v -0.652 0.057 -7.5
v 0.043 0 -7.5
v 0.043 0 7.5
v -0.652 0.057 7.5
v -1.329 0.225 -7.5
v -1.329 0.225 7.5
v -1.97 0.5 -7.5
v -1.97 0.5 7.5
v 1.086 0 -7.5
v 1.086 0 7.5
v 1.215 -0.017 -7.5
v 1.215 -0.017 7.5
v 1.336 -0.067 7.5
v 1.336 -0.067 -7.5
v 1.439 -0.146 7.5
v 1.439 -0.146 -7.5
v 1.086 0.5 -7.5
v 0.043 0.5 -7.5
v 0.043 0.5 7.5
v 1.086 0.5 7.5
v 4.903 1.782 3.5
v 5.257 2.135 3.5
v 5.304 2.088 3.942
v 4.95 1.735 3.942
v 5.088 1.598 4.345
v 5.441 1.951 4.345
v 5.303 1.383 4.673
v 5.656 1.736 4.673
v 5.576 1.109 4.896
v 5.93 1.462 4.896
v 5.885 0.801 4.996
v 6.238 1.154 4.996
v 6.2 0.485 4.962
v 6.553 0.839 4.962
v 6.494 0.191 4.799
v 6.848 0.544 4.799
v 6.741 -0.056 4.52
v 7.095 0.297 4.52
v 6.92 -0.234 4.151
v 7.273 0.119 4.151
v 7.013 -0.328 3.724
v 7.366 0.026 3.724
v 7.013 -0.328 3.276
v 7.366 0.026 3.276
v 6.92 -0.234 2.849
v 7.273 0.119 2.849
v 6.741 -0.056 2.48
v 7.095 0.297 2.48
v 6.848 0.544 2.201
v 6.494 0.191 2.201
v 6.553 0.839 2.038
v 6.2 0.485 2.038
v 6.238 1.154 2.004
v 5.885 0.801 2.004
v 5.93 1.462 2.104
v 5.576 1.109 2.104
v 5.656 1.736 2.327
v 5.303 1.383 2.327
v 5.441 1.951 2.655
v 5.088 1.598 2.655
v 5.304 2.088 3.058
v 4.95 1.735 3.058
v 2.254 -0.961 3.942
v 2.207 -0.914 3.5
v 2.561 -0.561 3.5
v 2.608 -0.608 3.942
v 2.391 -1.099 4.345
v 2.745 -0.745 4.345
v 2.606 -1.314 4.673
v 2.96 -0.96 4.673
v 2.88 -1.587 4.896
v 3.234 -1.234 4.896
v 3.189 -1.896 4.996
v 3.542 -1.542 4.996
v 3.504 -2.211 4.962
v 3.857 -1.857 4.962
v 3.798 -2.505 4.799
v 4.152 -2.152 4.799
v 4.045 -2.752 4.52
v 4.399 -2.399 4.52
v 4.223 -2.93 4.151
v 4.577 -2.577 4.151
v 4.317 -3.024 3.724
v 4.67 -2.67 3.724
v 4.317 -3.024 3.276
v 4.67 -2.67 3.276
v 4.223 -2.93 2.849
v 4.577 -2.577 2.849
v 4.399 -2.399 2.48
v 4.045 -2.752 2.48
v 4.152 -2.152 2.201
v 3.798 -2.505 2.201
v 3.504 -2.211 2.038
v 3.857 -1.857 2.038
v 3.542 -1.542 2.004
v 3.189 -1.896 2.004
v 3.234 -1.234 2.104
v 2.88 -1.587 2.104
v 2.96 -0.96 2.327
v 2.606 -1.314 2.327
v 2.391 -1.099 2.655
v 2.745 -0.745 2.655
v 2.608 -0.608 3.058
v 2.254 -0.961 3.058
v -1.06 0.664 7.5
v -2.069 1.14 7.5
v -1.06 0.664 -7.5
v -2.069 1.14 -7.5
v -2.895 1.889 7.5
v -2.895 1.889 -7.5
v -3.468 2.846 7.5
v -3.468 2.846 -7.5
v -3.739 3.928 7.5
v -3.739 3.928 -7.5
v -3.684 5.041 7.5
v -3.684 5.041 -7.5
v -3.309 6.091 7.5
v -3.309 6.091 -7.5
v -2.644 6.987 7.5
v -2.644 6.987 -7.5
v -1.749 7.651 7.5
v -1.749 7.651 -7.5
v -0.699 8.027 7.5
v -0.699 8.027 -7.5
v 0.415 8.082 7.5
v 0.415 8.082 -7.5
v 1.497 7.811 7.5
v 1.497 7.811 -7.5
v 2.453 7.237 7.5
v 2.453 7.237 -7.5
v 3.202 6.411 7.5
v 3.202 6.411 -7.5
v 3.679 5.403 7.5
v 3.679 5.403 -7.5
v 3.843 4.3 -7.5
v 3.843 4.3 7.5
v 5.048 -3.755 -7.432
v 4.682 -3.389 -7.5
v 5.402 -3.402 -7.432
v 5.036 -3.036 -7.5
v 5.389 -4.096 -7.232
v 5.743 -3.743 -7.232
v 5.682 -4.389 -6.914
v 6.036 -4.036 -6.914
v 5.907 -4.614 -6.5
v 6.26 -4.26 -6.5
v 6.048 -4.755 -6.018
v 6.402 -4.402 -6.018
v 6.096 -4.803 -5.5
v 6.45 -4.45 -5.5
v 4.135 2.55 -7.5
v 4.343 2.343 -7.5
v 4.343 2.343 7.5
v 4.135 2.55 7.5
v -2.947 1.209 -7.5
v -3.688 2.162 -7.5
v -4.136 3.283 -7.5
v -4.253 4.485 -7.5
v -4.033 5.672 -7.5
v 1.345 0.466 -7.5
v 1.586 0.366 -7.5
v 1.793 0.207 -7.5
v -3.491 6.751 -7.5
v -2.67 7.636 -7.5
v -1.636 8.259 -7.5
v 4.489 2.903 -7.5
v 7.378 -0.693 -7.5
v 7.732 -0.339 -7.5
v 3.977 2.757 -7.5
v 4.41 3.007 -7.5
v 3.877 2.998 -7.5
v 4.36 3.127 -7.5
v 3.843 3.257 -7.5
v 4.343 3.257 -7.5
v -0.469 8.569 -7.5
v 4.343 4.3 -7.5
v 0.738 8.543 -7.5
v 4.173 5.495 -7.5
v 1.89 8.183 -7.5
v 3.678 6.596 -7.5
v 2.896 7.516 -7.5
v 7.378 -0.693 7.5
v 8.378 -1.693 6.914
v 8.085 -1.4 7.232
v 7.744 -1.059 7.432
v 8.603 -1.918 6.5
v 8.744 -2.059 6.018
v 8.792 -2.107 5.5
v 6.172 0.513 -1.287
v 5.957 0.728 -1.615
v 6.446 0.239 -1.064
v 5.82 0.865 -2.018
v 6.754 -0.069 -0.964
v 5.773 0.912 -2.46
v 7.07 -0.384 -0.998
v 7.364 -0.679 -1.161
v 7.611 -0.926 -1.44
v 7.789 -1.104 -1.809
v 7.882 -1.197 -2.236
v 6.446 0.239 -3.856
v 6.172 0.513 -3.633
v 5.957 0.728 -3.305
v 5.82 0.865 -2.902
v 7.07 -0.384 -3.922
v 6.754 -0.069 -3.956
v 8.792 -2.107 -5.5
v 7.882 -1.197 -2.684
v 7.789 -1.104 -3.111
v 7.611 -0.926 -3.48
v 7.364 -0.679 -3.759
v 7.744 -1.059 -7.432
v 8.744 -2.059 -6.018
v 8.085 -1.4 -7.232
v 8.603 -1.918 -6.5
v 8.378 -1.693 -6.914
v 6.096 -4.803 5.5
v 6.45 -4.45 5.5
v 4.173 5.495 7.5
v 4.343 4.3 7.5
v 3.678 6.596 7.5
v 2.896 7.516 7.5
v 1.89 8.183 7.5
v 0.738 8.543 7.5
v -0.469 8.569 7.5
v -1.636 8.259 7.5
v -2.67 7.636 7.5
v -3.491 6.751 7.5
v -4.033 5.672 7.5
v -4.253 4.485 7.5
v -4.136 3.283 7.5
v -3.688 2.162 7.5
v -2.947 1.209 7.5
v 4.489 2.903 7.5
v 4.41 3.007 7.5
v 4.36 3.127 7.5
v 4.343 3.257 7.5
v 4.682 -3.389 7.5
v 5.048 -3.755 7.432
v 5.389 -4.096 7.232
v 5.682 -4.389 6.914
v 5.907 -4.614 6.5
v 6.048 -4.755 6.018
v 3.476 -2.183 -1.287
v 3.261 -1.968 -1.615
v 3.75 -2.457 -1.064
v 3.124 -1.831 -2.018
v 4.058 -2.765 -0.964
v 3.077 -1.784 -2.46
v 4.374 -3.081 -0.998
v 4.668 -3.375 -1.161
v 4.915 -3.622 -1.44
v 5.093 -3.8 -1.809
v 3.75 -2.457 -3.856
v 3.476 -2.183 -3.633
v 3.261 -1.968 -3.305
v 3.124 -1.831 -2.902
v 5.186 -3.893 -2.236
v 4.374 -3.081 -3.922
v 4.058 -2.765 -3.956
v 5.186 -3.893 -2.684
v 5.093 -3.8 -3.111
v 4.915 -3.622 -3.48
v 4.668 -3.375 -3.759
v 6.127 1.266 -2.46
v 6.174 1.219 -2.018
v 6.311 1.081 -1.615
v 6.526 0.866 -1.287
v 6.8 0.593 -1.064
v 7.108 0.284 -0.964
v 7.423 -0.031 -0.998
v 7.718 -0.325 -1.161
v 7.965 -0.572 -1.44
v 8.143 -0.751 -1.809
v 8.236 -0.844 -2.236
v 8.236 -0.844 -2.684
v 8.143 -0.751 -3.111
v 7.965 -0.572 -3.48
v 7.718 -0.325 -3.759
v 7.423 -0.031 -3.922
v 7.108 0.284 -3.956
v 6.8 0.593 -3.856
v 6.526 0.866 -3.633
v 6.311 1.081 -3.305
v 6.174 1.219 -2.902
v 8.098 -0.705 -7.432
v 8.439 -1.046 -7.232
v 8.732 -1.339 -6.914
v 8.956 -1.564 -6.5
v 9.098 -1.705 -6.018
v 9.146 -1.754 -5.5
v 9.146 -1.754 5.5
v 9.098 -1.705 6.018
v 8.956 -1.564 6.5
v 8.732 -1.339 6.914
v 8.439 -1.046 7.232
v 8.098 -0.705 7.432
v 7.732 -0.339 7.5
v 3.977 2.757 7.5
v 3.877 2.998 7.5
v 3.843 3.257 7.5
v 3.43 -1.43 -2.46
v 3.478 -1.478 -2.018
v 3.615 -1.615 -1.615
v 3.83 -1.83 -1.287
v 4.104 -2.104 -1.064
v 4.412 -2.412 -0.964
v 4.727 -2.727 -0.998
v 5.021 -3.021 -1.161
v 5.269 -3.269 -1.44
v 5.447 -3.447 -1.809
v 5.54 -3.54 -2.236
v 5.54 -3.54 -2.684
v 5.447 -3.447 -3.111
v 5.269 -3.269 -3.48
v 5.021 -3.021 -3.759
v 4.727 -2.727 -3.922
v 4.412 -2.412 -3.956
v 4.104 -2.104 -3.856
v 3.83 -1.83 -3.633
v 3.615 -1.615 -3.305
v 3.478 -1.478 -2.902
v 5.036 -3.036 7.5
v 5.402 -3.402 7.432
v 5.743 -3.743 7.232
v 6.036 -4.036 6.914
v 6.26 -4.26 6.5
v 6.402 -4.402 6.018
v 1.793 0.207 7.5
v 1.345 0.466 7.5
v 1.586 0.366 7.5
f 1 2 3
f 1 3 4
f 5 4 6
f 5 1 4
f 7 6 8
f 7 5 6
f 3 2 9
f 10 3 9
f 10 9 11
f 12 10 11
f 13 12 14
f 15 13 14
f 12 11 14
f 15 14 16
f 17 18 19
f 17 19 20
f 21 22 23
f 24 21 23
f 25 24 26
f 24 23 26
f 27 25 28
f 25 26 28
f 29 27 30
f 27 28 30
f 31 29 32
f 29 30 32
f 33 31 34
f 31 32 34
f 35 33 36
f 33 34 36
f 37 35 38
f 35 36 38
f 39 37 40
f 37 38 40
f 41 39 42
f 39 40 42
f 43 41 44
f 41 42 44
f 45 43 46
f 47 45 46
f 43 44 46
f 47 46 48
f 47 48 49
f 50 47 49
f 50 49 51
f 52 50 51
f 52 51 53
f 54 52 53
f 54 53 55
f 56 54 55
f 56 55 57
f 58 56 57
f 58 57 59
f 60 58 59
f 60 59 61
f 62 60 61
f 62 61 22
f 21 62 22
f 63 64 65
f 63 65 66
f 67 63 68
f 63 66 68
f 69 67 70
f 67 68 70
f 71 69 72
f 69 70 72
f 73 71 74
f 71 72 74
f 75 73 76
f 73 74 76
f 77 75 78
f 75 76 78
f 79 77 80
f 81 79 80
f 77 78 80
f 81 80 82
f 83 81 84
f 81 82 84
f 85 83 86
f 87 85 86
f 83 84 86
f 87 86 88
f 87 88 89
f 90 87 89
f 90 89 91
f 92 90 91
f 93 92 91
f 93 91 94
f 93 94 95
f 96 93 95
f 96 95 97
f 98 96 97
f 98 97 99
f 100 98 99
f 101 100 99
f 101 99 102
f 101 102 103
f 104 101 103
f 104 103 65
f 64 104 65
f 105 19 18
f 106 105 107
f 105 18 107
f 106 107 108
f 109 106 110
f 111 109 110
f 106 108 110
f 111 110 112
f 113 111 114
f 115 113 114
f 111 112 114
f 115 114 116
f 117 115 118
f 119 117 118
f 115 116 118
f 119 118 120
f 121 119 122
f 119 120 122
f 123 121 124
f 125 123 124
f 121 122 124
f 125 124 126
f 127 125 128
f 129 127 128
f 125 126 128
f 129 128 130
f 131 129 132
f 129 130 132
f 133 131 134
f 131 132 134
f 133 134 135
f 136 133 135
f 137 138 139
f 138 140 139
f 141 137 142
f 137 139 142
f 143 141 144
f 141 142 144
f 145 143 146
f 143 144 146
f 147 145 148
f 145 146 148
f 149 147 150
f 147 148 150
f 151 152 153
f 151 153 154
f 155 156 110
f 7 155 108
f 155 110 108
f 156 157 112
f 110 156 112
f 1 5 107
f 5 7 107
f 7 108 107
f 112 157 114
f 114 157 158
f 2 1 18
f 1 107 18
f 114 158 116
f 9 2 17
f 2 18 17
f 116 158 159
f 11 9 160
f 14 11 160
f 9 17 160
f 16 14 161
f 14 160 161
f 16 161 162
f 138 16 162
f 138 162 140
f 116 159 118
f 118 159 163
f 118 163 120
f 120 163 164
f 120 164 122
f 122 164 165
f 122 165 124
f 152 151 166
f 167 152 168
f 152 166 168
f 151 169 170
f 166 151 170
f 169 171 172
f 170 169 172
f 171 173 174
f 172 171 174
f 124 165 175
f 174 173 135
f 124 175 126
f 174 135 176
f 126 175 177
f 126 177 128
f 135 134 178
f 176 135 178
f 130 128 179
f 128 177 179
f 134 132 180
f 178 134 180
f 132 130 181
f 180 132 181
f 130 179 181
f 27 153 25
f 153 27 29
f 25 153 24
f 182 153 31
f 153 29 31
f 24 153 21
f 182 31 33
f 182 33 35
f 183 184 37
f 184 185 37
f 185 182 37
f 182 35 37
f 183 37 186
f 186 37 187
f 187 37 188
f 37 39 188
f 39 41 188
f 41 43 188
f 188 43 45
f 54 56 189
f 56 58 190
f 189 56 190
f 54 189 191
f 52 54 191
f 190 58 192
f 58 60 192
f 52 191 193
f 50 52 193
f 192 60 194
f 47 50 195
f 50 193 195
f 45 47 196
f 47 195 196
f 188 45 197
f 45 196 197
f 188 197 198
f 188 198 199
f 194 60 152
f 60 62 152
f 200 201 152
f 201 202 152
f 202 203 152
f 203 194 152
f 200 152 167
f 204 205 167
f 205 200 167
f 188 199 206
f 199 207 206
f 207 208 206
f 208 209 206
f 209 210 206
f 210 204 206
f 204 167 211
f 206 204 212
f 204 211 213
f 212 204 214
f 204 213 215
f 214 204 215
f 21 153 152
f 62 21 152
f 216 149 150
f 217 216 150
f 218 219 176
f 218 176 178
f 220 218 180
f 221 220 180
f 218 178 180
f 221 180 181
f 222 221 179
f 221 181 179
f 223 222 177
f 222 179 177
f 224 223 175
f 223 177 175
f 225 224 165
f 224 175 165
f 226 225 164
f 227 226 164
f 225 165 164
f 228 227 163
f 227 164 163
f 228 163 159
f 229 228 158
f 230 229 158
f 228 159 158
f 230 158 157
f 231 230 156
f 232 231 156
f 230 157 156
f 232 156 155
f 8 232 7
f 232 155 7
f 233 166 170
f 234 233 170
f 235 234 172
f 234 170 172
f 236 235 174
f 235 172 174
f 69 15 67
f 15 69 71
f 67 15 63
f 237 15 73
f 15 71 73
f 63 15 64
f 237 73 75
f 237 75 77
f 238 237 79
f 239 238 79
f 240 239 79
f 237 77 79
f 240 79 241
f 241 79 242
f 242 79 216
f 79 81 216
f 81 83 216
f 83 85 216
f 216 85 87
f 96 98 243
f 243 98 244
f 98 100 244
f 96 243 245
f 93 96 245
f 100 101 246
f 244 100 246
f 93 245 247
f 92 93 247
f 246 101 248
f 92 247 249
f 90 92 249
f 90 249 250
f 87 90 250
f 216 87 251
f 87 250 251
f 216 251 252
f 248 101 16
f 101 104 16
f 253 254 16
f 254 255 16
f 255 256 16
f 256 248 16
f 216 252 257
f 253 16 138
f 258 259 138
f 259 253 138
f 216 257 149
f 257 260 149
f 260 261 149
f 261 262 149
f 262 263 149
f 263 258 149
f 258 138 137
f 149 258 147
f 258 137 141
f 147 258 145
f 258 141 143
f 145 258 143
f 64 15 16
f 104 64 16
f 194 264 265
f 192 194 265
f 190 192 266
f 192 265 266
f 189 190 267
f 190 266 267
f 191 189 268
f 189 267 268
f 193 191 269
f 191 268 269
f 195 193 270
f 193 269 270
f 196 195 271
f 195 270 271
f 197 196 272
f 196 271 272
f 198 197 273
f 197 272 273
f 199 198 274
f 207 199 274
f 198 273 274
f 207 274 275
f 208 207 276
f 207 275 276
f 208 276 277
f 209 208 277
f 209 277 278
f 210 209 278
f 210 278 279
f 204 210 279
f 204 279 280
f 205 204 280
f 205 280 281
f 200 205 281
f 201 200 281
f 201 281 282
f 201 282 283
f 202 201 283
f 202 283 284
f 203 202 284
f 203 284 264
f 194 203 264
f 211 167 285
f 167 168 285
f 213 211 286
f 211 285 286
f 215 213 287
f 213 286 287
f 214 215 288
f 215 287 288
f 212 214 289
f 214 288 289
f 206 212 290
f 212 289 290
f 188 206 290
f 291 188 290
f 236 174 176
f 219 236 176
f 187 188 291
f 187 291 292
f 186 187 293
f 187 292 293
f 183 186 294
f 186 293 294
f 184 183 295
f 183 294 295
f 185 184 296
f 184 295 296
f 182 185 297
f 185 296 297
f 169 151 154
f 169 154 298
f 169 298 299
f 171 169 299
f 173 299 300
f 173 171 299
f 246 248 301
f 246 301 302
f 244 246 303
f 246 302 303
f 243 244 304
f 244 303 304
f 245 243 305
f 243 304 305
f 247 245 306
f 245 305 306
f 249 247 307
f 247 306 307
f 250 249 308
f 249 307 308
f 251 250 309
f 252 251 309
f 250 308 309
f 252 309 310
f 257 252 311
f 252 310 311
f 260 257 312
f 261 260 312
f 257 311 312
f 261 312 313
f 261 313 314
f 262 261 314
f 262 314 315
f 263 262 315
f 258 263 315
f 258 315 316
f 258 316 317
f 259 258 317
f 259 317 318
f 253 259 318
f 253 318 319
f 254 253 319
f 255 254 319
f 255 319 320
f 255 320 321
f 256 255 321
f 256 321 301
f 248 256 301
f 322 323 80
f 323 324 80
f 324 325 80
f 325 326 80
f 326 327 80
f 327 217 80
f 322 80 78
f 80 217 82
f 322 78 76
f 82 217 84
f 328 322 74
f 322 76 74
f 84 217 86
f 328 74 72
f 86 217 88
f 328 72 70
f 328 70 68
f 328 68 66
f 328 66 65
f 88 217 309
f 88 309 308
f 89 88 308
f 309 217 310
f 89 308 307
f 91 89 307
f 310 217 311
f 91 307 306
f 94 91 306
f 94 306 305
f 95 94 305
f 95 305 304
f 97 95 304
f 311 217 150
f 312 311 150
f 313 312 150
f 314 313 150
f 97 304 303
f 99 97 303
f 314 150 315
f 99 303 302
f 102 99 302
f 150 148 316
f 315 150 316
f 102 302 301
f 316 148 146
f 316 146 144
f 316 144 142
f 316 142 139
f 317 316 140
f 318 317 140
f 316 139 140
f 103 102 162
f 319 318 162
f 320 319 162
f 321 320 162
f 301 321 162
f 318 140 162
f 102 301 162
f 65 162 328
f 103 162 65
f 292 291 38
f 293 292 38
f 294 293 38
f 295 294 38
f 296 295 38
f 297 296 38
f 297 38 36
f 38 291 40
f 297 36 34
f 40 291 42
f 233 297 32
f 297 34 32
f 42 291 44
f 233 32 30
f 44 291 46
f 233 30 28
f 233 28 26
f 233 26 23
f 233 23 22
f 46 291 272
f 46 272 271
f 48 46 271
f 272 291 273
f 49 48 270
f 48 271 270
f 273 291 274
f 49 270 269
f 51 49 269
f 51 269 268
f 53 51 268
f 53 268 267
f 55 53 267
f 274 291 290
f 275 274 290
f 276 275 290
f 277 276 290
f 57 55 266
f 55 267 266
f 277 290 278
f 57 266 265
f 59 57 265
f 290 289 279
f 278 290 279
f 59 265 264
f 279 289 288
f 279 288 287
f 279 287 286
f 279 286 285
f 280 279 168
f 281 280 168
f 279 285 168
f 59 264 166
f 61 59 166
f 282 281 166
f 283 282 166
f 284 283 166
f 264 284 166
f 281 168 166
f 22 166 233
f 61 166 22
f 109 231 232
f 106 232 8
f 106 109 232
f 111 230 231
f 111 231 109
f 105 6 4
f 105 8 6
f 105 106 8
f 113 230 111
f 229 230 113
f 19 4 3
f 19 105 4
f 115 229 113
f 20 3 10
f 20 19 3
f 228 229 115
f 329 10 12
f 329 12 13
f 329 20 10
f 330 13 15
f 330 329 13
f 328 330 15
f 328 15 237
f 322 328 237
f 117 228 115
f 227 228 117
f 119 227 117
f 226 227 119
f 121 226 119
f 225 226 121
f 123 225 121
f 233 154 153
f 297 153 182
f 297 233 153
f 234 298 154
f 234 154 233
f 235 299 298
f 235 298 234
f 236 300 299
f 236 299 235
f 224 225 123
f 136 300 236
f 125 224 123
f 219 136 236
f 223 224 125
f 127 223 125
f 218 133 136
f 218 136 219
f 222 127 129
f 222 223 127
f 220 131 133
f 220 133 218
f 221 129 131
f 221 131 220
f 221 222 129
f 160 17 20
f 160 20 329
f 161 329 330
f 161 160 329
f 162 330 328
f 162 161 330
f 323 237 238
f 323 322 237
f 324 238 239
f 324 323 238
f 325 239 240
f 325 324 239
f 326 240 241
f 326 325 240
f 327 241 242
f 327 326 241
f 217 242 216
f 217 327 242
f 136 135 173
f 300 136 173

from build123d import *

# Parameters (mm, degrees)
SKETCH_1_W               = 23
SKETCH_1_H               = 15
EXTRUDE_1_DEPTH          = 0.5
OTHER_START              = -7.5
OTHER_1_DEPTH            = 15
OTHER_1_2_DEPTH          = 15
SM_START                 = -7.5
SM_EDGE_FLANGE_1_DEPTH   = 15
SM_EDGE_FLANGE_1_2_DEPTH = 15
FILLET_1_R               = 2
SKETCH_16_R              = 1.5
CUT_EXTRUDE_1_DEPTH      = 10


# Read off the part's stored shape, not the designer's step: Нарисованный сгиб1, Ребро-кромка1
with BuildPart() as part:
    # Sketch 1 → Бобышка-Вытянуть1 (new body)
    with BuildSketch(Plane(origin=(0, 0, 0), x_dir=(1, 0, 0), z_dir=(0, 1, 0))):
        with Locations((-9.5, 0)):
            Rectangle(SKETCH_1_W, SKETCH_1_H)
    extrude(amount=EXTRUDE_1_DEPTH)

    # Other 1 outline → Other 1 (cut)
    with BuildSketch(Plane.XY.offset(OTHER_START)):
        with BuildLine():
            ThreePointArc((0.042587685, 0), (-0.994234383, 0.126871677), (-1.969873495, 0.5))
            Line((-1.969873495, 0.5), (-21, 0.5))
            Line((-21, 0.5), (-21, 0))
            Line((-21, 0), (0.042587685, 0))
        make_face()
    extrude(amount=OTHER_1_DEPTH, mode=Mode.SUBTRACT)

    # Other 1 2 outline → Other 1 2 (add)
    with BuildSketch(Plane.XY.offset(OTHER_START)):
        with BuildLine():
            ThreePointArc((0.042587685, 0.5), (-2.644418083, 6.987005769), (3.842587685, 4.3))
            Line((3.842587685, 4.3), (3.842587685, 2.342587685))
            Line((3.842587685, 2.342587685), (4.342587685, 2.342587685))
            Line((4.342587685, 2.342587685), (4.342587685, 4.3))
            ThreePointArc((4.342587685, 4.3), (-2.175115736, 7.983991251), (-1.969873495, 0.5))
            Line((-1.969873495, 0.5), (0.042587685, 0.5))
        make_face()
    extrude(amount=OTHER_1_2_DEPTH)

    # Ребро-кромка1 outline → Ребро-кромка1 (cut)
    with BuildSketch(Plane.XY.offset(SM_START)):
        with BuildLine():
            ThreePointArc((1.085786438, 0.5), (1.46846987, 0.423879533), (1.792893219, 0.207106781))
            Line((1.792893219, 0.207106781), (2, 0))
            Line((2, 0), (2, 0.5))
            Line((2, 0.5), (1.085786438, 0.5))
        make_face()
        with BuildLine():
            Line((3.842587685, 2.342587685), (4.342587685, 2.342587685))
            Line((4.342587685, 2.342587685), (4.135480904, 2.549694466))
            ThreePointArc((4.135480904, 2.549694466), (3.918708153, 2.874117815), (3.842587685, 3.256801248))
            Line((3.842587685, 3.256801248), (3.842587685, 2.342587685))
        make_face()
    extrude(amount=SM_EDGE_FLANGE_1_DEPTH, mode=Mode.SUBTRACT)

    # Sm Edge Flange 1 2 outline → Sm Edge Flange 1 2 (add)
    with BuildSketch(Plane.XY.offset(SM_START)):
        with BuildLine():
            Line((6.449747468, -4.449747468), (2, 0))
            Line((2, 0), (1.085786438, 0))
            ThreePointArc((1.085786438, 0), (1.277128154, -0.038060234), (1.439339828, -0.146446609))
            Line((1.439339828, -0.146446609), (6.096194078, -4.803300859))
            Line((6.096194078, -4.803300859), (6.449747468, -4.449747468))
        make_face()
        with BuildLine():
            Line((8.792335154, -2.107159783), (9.145888544, -1.753606392))
            Line((9.145888544, -1.753606392), (4.489034295, 2.903247857))
            ThreePointArc((4.489034295, 2.903247857), (4.380647919, 3.065459531), (4.342587685, 3.256801248))
            Line((4.342587685, 3.256801248), (4.342587685, 2.342587685))
            Line((4.342587685, 2.342587685), (8.792335154, -2.107159783))
        make_face()
    extrude(amount=SM_EDGE_FLANGE_1_2_DEPTH)

    # Скругление1
    fillet_1_edges = [part.edges().sort_by_distance(p)[0] for p in [
        (8.969111849, -1.930383088, 7.5),
        (8.969111849, -1.930383088, -7.5),
        (6.272970773, -4.626524164, -7.5),
        (6.272970773, -4.626524164, 7.5),
    ]]
    fillet(fillet_1_edges, radius=FILLET_1_R)

    # Эскиз16 → Вырез-Вытянуть1 (cut)
    with BuildSketch(Plane(origin=(3.696141076, 3.696141076, 0), x_dir=(0, 0, -1), z_dir=(0.7071067811865587, 0.7071067811865365, 0))):
        with Locations(Location((2.46, -4.937106781, 0), (0, 0, 90))):
            Circle(SKETCH_16_R)
        with Locations(Location((-3.5, -3.707106781, 0), (0, 0, 90))):
            Circle(SKETCH_16_R)
    extrude(amount=-CUT_EXTRUDE_1_DEPTH, mode=Mode.SUBTRACT)


solid = part.part
